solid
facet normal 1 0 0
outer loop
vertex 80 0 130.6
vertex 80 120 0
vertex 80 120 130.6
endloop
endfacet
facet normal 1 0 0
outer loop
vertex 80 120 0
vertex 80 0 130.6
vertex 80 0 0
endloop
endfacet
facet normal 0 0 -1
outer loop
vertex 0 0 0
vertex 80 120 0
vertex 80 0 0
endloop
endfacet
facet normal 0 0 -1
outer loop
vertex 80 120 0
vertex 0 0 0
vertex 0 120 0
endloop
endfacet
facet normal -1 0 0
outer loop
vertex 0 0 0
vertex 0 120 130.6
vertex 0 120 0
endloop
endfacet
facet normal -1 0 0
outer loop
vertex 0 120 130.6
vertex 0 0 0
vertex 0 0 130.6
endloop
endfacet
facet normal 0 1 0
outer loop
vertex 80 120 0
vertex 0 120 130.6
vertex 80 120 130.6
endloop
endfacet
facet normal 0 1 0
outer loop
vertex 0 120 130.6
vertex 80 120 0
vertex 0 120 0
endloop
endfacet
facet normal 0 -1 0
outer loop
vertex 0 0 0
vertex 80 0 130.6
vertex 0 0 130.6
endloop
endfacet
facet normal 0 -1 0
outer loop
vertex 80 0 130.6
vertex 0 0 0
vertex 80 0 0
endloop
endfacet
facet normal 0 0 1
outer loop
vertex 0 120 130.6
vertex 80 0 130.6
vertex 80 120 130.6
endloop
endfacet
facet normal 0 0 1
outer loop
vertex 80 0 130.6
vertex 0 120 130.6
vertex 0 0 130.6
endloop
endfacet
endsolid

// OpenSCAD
// Architectural thermal visualization; dimensions are scaled.
color([0.8688,0,0.1312,0.75]) translate([0,0,0.00000]) cube([80.00000,120.00000,18.00000]);
color([0.9352,0,0.0648,0.75]) translate([0,0,18.00000]) cube([80.00000,120.00000,10.00000]);
color([0.9416,0,0.0584,0.75]) translate([0,0,28.00000]) cube([80.00000,120.00000,10.00000]);
color([0.9730,0,0.0270,0.75]) translate([0,0,38.00000]) cube([80.00000,120.00000,1.50000]);
color([1.0000,0,0.0000,0.75]) translate([0,0,39.50000]) cube([80.00000,120.00000,3.20000]);
color([0.9494,0,0.0506,0.75]) translate([0,0,42.70000]) cube([80.00000,120.00000,1.50000]);
color([0.8988,0,0.1012,0.75]) translate([0,0,44.20000]) cube([80.00000,120.00000,3.20000]);
color([0.8574,0,0.1426,0.75]) translate([0,0,47.40000]) cube([80.00000,120.00000,1.50000]);
color([0.8159,0,0.1841,0.75]) translate([0,0,48.90000]) cube([80.00000,120.00000,3.20000]);
color([0.7804,0,0.2196,0.75]) translate([0,0,52.10000]) cube([80.00000,120.00000,1.50000]);
color([0.7449,0,0.2551,0.75]) translate([0,0,53.60000]) cube([80.00000,120.00000,3.20000]);
color([0.7134,0,0.2866,0.75]) translate([0,0,56.80000]) cube([80.00000,120.00000,1.50000]);
color([0.6820,0,0.3180,0.75]) translate([0,0,58.30000]) cube([80.00000,120.00000,3.20000]);
color([0.6535,0,0.3465,0.75]) translate([0,0,61.50000]) cube([80.00000,120.00000,1.50000]);
color([0.6250,0,0.3750,0.75]) translate([0,0,63.00000]) cube([80.00000,120.00000,3.20000]);
color([0.5987,0,0.4013,0.75]) translate([0,0,66.20000]) cube([80.00000,120.00000,1.50000]);
color([0.5724,0,0.4276,0.75]) translate([0,0,67.70000]) cube([80.00000,120.00000,3.20000]);
color([0.5478,0,0.4522,0.75]) translate([0,0,70.90000]) cube([80.00000,120.00000,1.50000]);
color([0.5232,0,0.4768,0.75]) translate([0,0,72.40000]) cube([80.00000,120.00000,3.20000]);
color([0.4326,0,0.5674,0.75]) translate([0,0,75.60000]) cube([80.00000,120.00000,5.00000]);
color([0.3413,0,0.6587,0.75]) translate([0,0,80.60000]) cube([80.00000,120.00000,50.00000]);
